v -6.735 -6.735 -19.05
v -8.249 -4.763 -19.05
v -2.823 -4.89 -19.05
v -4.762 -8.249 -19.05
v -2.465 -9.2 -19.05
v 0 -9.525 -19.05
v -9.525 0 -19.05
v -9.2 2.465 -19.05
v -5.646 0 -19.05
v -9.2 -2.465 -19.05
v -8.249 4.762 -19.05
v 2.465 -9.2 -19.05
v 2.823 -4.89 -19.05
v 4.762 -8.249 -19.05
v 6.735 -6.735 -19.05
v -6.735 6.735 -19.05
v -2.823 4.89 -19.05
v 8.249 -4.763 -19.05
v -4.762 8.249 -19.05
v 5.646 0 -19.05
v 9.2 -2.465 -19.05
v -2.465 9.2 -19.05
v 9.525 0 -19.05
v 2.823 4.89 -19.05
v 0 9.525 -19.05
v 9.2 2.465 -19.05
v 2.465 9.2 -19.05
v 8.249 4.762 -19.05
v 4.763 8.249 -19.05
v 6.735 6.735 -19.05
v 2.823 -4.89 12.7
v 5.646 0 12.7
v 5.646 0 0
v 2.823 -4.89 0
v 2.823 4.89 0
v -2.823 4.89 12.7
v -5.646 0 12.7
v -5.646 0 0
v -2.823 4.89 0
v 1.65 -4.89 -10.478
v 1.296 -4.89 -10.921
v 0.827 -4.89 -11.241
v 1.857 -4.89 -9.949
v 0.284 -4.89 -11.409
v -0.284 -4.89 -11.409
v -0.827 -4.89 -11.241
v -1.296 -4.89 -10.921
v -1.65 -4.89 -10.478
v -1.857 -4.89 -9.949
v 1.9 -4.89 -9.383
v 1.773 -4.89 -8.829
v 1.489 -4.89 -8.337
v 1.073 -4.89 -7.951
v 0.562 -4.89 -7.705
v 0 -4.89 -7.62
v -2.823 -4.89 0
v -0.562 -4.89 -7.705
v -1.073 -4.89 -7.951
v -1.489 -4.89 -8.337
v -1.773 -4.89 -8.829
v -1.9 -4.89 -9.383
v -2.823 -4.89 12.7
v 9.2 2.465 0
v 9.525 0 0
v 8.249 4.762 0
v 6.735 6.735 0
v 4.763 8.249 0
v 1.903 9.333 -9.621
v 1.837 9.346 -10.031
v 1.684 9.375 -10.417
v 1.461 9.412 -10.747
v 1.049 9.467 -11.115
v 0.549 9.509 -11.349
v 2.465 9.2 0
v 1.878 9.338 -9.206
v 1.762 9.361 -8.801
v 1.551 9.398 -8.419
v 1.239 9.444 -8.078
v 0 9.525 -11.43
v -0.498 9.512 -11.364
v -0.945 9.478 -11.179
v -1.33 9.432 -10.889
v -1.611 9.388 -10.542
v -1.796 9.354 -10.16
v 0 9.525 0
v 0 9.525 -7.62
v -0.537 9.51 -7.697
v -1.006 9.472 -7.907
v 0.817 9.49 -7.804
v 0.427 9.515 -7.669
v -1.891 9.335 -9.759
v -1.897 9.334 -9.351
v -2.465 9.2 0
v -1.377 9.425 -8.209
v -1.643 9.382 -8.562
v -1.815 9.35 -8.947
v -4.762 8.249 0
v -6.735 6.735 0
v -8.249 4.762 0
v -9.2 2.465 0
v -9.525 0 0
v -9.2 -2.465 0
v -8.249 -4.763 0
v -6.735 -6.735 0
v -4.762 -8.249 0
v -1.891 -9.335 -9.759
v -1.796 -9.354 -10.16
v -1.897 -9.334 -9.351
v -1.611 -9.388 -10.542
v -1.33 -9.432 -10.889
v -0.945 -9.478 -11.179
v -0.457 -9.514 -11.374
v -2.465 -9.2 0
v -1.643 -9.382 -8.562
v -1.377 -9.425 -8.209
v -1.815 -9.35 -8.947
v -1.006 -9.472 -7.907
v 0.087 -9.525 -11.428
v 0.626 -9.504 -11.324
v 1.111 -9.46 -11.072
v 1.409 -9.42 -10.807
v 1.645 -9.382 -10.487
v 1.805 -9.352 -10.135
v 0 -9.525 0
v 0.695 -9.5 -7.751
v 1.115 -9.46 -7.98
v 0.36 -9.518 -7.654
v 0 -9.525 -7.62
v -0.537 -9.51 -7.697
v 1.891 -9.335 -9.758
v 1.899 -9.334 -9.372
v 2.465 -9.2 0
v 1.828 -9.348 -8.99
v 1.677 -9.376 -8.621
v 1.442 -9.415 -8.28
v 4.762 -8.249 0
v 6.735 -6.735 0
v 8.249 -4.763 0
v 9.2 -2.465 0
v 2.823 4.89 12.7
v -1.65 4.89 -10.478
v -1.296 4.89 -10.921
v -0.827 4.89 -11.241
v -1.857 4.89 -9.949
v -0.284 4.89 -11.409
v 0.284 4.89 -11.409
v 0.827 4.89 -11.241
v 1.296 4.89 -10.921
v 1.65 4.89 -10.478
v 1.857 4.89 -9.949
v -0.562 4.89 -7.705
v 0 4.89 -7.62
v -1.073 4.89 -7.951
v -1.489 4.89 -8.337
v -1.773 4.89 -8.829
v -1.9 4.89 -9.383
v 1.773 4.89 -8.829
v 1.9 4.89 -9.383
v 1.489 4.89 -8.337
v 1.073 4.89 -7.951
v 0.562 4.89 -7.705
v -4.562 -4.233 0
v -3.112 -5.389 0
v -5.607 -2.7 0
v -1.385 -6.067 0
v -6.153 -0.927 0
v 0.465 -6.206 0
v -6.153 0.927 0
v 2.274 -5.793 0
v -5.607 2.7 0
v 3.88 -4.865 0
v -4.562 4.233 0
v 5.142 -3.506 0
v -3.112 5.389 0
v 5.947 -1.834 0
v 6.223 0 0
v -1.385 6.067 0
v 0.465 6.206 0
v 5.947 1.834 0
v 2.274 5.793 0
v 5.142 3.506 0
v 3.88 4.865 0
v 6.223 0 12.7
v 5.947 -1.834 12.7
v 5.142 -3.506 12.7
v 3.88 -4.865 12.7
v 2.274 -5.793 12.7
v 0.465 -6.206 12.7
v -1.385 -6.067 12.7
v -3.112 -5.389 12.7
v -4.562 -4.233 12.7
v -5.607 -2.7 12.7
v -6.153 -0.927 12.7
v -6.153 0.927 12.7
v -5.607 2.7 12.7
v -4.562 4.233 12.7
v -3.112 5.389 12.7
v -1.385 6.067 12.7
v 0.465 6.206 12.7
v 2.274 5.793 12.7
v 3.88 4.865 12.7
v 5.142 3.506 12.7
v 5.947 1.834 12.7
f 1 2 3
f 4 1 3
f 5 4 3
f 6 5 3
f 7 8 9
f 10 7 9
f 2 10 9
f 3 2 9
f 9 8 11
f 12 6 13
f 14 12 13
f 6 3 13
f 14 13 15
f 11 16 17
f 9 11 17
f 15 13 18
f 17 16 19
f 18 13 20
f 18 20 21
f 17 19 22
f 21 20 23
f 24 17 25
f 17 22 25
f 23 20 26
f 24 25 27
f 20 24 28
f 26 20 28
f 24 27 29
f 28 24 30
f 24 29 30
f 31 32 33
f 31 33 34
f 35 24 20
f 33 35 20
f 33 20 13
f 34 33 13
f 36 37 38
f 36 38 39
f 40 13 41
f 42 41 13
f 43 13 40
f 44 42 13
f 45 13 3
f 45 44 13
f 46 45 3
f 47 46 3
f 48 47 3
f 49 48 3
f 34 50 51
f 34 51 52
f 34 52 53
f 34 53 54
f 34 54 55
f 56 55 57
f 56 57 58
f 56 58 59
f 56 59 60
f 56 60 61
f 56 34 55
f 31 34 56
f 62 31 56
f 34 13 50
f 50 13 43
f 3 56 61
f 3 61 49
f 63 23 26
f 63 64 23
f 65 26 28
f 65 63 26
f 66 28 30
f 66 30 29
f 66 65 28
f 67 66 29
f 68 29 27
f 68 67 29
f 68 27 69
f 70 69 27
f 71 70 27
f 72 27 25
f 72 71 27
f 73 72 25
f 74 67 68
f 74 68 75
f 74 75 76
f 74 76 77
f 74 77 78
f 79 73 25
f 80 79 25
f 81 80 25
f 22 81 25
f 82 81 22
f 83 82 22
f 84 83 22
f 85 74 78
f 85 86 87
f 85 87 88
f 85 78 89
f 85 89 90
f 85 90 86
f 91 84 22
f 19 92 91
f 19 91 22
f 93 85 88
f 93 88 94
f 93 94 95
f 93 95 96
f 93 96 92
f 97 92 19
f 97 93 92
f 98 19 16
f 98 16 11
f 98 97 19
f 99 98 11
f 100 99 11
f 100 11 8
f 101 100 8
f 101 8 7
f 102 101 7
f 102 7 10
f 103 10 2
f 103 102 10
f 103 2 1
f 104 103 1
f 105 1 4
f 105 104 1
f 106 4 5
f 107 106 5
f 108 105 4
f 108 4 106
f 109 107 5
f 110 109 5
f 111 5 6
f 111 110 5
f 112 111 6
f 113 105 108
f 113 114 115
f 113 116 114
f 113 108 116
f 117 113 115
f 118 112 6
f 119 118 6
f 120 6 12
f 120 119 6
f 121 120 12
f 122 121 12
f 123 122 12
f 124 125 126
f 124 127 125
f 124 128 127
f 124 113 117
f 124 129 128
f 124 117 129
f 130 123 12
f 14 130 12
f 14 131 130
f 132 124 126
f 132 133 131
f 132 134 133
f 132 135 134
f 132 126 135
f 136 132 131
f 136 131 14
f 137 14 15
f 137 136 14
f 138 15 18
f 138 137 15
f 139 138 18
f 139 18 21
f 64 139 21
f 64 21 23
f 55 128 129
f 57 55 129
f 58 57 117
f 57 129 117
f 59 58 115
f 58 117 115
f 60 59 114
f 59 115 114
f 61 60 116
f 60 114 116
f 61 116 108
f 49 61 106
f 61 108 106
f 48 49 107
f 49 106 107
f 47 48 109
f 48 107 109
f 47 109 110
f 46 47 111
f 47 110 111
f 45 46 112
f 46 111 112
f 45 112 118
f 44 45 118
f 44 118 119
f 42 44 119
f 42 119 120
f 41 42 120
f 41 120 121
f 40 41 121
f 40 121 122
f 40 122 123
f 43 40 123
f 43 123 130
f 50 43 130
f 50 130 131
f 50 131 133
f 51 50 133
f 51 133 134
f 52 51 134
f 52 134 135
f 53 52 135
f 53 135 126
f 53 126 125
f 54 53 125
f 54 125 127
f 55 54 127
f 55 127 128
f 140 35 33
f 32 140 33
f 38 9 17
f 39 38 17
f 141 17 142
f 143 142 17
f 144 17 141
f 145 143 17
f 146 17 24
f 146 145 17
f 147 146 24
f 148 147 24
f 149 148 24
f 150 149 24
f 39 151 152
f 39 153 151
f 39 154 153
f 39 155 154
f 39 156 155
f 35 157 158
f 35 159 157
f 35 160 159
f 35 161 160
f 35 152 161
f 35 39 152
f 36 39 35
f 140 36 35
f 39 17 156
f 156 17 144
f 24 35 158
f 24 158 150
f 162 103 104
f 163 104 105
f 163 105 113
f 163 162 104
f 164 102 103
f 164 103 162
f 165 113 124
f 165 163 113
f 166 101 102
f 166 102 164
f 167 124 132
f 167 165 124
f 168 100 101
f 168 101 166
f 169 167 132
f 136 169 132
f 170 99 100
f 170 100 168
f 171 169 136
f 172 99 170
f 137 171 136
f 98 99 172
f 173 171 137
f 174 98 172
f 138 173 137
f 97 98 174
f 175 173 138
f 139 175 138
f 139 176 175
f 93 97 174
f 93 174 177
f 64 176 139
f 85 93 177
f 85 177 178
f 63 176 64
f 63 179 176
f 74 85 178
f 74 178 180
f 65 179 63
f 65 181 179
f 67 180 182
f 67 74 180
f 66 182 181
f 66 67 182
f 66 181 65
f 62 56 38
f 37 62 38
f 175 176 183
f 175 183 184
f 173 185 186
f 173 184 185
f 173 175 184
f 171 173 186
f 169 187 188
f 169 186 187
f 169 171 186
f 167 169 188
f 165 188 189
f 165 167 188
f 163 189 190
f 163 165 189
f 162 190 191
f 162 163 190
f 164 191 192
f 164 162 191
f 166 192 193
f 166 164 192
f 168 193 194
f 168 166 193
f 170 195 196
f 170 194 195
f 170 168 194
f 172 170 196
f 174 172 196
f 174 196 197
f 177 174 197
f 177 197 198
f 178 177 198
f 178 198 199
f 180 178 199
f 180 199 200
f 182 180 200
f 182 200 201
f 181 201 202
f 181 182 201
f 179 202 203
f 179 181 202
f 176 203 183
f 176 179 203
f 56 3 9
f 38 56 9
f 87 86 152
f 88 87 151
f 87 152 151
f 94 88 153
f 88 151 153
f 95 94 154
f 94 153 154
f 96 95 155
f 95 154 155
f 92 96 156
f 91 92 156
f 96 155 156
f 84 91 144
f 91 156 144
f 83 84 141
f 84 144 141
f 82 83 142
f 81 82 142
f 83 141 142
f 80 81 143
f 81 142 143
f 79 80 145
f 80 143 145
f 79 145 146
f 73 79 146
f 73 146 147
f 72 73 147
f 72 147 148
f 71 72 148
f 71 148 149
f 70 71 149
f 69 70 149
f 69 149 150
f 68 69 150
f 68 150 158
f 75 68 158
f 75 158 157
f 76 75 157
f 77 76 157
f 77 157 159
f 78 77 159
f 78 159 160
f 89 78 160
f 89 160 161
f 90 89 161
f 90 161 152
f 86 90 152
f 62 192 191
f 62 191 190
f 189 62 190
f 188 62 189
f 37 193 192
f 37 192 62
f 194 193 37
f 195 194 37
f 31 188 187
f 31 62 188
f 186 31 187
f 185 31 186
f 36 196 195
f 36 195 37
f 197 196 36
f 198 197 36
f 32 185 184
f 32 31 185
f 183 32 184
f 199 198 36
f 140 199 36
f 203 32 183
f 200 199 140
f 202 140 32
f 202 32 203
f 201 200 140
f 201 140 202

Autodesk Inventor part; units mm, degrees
ref_plane "YZ Plane" through (0, 0, 0) normal (1, 0, 0) x (0, 1, 0)
ref_plane "XY Plane" through (0, 0, 0) normal (0, 0, 1) x (1, 0, 0)
sketch "Sketch1" plane through (0, 0, 0) normal (0, 0, 1) x (1, 0, 0)
  line L0 (2.7496, 4.7625) -> (5.4993, 0)
  line L1 (5.4993, 0) -> (2.7496, -4.7625)
  line L2 (2.7496, -4.7625) -> (-2.7496, -4.7625)
  line L3 (-2.7496, -4.7625) -> (-5.4993, 0)
  line L4 (-5.4993, 0) -> (-2.7496, 4.7625)
  line L5 (-2.7496, 4.7625) -> (2.7496, 4.7625)
  circle A0 centre (0, 0) radius 9.525
  circle A1 centre (0, 0) radius 5.4993 construction
  dimension "d0" = 9.525
  dimension "d2" = 19.05
  dimension "d3" = 4.0257
extrude "Extrusion1" add sketch "Sketch1" against normal blind 19.05
thicken "Thicken Hex" operation add thickness 0.127 both sides no extend neighbours yes toward (-0.8660254, 0.5, 0) faces at (-4.5827, 1.5875, -6.35) (-3.6662, -3.175, -6.35) (0.9165, -4.7625, -6.35) (-0.9165, 4.7625, -6.35) (3.6662, 3.175, -6.35) (4.5827, -1.5875, -6.35)
sketch "Sketch3" plane through (0, 0, 0) normal (0, 0, 1) x (1, 0, 0)
  line L0 (5.6459, 0) -> (2.823, -4.8895)
  line L1 (2.823, -4.8895) -> (-2.823, -4.8895)
  line L2 (-2.823, -4.8895) -> (-5.6459, 0)
  line L3 (-5.6459, 0) -> (-2.823, 4.8895)
  line L4 (-2.823, 4.8895) -> (2.823, 4.8895)
  line L5 (2.823, 4.8895) -> (5.6459, 0)
  line L6 (2.823, 4.8895) -> (5.6459, 0) projected
  circle A0 centre (0, 0) radius 6.35
  dimension "d10" = 12.7
extrude "Extrusion2" add sketch "Sketch3" along normal blind 12.7
thicken "Thicken2" operation add thickness 0.127 both sides no extend neighbours yes toward (-0.9967573, 0.0804666, 0) faces at (6.3294, -0.511, 8.4667)
ref_plane "Work Plane1" through (0, 9.525, 0) normal (0, 1, 0) x (-1, 0, 0)
sketch "Sketch4" plane through (0, 9.525, 0) normal (0, 1, 0) x (-1, 0, 0)
  line L0 (0, 0) -> (0, -19.05) construction
  line L1 (2.823, -19.05) -> (-2.823, -19.05) construction
  point P0 (0, -9.525)
hole "Hole1" at (0, 9.525, -9.525) direction (0, -1, 0) diameter 3.81 end through all clearance for "Flat Head Machine Screw (82)" size "#6" standard "Ansi Unified Screw Threads"
equation "\"d0\" = hexSize"
equation "\"d2\" = exteriorDiameter"
equation "\"d4\" = length"
equation "\"d6\" = printSpacing"
equation "\"d7\" = printSpacing"
equation "\"d10\" = baseBushingDiameter"
equation "\"d8\" = baseBushingLength"
equation "\"d11\" = printSpacing"
equation "\"d12\" = printSpacing"
equation "\"hexSize\" = 9.525"
equation "\"exteriorDiameter\" = 19.05"
equation "\"length\" = 19.05"
equation "\"printSpacing\" = 0.127"
equation "\"baseBushingDiameter\" = 12.7"
equation "\"baseBushingLength\" = 12.7"
properties part number "3_8x3_4x3_4-hexBearingEndCap" material "PC/ABS Plastic"
